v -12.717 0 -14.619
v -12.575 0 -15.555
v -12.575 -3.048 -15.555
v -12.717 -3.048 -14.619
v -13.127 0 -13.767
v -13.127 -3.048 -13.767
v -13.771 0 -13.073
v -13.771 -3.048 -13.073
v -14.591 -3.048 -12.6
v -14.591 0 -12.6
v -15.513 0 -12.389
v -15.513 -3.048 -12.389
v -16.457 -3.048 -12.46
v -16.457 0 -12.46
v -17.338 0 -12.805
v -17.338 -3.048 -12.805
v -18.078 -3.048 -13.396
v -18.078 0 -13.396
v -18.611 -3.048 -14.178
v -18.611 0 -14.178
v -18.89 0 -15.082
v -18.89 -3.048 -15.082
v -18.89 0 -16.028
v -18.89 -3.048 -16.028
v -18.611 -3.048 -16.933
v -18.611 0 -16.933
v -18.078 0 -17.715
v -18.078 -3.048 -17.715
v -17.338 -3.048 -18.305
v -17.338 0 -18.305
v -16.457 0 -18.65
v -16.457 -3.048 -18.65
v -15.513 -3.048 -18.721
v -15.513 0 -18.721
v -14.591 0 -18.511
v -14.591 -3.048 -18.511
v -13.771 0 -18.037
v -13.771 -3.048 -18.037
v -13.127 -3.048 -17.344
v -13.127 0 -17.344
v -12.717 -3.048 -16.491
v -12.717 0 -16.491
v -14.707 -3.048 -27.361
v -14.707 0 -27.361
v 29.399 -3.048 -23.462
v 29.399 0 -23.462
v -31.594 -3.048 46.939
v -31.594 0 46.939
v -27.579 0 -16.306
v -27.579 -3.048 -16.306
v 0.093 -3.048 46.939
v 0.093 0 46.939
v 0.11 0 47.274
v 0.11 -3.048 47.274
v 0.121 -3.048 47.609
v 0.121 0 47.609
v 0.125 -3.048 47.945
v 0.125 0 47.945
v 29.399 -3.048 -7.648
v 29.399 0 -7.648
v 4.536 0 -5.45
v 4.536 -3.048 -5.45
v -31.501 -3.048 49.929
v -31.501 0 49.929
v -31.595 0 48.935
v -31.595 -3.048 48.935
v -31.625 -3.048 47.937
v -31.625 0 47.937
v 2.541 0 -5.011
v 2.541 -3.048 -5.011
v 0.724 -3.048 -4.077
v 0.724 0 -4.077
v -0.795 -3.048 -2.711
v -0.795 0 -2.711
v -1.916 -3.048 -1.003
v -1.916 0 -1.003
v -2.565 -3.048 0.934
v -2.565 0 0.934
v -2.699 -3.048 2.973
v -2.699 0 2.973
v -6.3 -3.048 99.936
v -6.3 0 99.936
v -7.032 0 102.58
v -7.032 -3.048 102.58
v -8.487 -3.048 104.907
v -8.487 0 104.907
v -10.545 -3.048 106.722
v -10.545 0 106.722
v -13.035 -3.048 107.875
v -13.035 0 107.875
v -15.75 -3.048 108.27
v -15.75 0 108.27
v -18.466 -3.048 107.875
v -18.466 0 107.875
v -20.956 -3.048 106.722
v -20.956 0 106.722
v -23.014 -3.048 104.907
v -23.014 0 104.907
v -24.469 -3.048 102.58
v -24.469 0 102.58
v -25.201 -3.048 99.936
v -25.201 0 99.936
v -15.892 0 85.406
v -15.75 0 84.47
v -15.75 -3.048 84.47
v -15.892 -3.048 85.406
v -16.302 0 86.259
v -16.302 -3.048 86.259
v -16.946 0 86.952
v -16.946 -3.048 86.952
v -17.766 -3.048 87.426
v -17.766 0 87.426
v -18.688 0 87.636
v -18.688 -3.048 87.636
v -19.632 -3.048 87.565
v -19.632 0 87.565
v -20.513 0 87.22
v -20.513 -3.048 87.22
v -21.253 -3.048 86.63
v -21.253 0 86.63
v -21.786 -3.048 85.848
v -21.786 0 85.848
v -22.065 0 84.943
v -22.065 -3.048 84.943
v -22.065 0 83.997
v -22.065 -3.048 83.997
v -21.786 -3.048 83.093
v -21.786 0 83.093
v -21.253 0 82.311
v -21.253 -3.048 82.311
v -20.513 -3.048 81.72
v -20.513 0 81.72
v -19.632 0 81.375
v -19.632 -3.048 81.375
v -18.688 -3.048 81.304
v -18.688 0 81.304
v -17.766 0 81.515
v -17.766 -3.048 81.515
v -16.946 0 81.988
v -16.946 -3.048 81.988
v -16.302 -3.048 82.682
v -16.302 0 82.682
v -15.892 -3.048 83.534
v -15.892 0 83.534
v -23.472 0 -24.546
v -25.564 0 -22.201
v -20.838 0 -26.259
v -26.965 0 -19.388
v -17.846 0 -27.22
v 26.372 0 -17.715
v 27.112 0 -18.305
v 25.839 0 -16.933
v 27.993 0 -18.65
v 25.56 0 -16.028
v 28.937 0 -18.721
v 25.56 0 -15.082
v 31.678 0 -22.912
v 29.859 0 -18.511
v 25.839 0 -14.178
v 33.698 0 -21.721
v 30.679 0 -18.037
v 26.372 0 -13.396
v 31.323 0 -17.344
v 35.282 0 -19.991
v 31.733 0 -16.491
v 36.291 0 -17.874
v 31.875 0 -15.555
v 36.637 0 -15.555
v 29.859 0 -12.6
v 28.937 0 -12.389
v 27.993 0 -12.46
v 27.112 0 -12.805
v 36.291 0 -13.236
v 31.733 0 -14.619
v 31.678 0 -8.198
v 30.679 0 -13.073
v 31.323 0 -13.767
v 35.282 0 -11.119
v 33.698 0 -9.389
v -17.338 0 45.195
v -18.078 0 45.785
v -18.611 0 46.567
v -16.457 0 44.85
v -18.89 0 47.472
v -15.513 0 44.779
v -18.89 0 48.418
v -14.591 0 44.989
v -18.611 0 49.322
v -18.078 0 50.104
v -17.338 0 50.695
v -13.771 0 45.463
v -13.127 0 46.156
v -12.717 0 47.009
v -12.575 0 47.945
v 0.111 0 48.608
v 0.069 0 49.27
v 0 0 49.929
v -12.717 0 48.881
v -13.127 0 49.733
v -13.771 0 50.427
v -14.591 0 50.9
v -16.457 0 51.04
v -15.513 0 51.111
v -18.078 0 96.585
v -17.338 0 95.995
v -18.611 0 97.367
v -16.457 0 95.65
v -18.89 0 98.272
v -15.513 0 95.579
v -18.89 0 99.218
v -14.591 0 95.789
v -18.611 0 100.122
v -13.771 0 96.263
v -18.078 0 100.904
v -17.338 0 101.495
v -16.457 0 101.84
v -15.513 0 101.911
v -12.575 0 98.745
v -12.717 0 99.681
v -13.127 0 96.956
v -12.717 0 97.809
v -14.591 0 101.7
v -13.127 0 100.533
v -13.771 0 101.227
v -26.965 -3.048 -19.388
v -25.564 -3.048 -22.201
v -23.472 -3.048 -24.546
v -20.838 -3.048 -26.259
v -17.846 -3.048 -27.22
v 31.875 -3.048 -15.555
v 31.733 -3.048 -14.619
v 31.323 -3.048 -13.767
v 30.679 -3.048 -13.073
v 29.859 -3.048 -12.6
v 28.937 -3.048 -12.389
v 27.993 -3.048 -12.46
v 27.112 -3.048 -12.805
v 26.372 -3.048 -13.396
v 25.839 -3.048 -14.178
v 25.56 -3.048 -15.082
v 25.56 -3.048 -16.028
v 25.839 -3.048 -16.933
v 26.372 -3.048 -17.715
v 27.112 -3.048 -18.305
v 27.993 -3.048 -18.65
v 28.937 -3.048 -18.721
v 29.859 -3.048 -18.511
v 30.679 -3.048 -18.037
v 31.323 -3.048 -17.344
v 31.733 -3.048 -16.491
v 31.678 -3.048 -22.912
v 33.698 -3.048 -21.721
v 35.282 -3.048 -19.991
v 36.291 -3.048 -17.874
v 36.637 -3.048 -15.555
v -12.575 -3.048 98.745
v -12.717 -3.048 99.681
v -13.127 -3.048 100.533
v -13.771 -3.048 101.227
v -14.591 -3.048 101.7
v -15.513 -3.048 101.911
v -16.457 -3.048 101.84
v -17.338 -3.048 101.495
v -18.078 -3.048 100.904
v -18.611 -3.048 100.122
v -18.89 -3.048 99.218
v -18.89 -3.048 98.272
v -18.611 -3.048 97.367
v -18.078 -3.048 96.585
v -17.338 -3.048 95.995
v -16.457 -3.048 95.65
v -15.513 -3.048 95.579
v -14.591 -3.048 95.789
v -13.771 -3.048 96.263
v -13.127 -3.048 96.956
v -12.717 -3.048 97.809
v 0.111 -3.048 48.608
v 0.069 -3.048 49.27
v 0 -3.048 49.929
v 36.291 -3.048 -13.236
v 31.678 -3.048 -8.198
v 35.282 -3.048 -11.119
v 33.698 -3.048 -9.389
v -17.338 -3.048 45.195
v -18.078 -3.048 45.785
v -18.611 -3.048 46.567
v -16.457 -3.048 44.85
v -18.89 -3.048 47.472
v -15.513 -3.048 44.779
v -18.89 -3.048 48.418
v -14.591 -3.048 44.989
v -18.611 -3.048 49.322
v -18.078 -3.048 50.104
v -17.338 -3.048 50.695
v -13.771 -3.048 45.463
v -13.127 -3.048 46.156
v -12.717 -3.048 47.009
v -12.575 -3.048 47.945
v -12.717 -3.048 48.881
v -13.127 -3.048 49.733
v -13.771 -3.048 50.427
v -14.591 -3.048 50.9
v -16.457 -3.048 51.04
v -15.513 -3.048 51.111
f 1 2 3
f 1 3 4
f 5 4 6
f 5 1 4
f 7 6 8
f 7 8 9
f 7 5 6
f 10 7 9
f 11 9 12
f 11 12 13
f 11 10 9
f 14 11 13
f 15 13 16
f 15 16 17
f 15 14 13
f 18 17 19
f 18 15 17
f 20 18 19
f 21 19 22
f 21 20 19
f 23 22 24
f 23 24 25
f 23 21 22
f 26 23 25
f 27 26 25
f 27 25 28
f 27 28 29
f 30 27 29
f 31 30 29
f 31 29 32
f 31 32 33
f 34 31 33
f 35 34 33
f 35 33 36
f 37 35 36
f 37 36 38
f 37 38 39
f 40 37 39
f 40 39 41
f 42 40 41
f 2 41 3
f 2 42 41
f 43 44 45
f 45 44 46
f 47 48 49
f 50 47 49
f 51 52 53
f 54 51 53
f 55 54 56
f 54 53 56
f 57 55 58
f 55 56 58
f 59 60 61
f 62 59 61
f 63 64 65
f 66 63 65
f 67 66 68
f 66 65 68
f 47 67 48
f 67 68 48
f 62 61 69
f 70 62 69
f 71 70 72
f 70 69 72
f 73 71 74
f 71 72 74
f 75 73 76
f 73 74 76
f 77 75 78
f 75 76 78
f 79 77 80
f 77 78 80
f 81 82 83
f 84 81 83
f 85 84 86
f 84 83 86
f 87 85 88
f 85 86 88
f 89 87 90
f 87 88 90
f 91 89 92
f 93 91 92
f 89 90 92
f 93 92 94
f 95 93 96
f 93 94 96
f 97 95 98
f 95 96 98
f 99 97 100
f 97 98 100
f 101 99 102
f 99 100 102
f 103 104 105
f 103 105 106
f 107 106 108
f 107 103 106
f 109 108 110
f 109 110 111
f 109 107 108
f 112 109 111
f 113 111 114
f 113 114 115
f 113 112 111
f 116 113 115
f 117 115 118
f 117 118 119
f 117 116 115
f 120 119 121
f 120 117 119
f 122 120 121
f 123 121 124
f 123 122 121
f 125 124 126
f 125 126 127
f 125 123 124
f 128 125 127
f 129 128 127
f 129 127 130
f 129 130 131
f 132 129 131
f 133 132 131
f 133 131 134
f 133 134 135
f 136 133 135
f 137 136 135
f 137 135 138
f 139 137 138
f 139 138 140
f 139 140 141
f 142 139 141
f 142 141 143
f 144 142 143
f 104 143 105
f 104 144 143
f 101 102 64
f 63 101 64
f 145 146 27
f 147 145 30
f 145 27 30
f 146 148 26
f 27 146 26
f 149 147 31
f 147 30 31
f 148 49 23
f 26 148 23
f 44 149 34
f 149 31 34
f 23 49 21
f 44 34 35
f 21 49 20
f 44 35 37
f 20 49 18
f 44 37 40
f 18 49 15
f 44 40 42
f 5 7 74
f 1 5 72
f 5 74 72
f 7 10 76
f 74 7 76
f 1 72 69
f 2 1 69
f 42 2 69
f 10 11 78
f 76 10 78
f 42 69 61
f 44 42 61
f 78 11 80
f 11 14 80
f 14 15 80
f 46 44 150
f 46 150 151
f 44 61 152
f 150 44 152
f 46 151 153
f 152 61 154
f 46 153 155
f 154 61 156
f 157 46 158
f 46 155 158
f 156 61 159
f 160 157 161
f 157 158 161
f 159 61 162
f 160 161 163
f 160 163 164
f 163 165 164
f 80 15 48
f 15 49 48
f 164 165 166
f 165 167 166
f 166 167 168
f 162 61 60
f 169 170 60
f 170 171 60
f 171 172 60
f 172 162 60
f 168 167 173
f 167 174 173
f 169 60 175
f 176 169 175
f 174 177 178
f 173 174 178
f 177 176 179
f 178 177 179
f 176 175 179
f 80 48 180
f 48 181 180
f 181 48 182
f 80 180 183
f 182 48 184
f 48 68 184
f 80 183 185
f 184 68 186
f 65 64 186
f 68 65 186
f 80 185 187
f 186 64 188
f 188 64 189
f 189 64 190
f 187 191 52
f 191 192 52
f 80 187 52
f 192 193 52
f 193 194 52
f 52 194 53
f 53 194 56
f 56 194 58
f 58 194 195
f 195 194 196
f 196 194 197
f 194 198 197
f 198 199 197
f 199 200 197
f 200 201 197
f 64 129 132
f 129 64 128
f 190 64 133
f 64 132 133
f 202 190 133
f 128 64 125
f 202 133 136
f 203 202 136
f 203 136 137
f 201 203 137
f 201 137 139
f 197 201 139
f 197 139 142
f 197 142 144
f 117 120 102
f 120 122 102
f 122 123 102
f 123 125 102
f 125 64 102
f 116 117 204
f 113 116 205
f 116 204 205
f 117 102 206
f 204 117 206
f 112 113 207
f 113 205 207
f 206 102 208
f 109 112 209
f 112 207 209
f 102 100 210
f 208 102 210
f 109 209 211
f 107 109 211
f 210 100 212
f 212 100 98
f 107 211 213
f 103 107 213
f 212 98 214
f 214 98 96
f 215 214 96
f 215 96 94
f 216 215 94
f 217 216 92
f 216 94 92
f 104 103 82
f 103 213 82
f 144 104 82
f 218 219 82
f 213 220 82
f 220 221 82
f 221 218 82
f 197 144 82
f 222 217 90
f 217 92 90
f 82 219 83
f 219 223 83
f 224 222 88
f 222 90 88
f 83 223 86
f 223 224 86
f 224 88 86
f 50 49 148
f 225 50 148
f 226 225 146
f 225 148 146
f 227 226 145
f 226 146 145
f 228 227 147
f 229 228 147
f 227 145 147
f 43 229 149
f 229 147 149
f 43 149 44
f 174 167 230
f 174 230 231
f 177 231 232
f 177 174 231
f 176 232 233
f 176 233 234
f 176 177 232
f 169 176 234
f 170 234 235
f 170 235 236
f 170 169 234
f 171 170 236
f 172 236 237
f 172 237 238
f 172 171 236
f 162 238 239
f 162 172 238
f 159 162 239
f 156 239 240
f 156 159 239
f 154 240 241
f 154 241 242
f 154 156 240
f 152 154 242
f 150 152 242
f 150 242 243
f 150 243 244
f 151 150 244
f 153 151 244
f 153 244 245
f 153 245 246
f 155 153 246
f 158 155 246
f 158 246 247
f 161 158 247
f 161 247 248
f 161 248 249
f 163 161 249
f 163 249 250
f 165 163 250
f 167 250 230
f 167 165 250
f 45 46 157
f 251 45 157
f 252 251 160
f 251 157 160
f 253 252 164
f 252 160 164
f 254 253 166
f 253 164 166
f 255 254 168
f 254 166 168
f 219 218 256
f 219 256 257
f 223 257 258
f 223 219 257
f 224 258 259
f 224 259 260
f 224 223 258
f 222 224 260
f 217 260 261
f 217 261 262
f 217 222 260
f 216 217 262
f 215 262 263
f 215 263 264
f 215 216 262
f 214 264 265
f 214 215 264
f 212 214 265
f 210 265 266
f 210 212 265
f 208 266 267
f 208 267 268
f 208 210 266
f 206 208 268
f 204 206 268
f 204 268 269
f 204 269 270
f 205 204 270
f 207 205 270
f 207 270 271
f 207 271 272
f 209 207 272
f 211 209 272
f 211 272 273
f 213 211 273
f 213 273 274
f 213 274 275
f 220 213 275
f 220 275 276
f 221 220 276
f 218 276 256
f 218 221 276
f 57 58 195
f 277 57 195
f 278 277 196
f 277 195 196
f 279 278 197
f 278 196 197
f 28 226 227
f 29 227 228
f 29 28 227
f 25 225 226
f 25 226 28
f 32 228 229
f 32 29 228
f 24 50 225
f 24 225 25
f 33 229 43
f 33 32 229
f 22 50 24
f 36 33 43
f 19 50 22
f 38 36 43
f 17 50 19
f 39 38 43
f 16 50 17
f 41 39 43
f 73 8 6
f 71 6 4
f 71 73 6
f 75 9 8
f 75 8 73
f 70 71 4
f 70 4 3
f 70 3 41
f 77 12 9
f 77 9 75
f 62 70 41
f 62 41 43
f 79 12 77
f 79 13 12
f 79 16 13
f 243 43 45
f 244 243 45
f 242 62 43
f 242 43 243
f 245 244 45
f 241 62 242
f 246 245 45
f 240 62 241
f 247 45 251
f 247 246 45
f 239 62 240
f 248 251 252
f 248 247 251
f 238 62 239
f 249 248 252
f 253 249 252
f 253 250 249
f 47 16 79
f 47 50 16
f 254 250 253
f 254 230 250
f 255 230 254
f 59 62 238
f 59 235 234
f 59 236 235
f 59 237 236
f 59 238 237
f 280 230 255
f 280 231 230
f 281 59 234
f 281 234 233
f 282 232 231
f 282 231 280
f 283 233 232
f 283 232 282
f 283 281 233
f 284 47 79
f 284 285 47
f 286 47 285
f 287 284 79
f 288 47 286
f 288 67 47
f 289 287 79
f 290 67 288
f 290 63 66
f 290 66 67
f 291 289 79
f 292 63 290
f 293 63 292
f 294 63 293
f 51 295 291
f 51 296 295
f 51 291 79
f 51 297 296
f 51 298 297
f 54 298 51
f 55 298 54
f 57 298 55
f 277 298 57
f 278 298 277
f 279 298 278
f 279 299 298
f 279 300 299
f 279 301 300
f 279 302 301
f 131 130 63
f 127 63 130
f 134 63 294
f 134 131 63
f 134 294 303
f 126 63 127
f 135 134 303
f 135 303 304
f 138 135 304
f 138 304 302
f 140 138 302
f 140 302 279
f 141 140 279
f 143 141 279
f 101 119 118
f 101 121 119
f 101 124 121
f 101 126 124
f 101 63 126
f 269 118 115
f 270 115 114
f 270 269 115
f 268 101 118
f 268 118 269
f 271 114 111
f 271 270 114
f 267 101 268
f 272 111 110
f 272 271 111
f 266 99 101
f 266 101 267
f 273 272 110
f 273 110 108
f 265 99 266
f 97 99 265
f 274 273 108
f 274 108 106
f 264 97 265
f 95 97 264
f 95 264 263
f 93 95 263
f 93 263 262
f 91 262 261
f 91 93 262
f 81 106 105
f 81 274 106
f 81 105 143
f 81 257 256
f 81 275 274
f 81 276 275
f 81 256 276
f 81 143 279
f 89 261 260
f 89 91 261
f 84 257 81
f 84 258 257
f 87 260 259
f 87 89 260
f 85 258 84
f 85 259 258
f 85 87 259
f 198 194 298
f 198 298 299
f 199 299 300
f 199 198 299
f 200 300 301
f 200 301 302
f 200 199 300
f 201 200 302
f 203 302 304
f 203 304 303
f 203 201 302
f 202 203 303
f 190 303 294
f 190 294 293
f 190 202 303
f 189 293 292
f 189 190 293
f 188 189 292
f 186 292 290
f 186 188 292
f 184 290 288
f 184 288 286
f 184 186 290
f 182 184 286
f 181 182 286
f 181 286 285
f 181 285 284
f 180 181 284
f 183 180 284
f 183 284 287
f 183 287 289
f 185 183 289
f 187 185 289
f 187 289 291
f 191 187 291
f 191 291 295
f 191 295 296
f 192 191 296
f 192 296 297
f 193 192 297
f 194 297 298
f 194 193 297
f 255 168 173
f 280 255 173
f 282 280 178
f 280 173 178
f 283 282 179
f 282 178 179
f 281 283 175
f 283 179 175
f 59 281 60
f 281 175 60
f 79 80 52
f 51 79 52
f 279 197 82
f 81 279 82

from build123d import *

# Parameters (mm, degrees)
F0_R     = 3.175
F1_DEPTH = 3.048


with BuildPart() as f1:
    # F0 (on Front) → F1 (new body)
    with BuildSketch(Plane.XZ):
        with BuildLine():
            ThreePointArc((0.124512, 47.944903), (0.093353, 48.939042), (0, 49.929278))
            ThreePointArc((0, 49.929278), (-15.750488, 63.819903), (-31.500977, 49.929278))
            ThreePointArc((-31.500977, 49.929278), (-31.617878, 48.436388), (-31.593595, 46.939124))
            ThreePointArc((-31.593595, 46.939124), (-15.750488, 32.069903), (0.092619, 46.939124))
            ThreePointArc((0.092619, 46.939124), (0.116536, 47.441761), (0.124512, 47.944903))
        make_face()
        with Locations((-15.750488, 47.944903)):
            Circle(F0_R, mode=Mode.SUBTRACT)
        with BuildLine():
            ThreePointArc((-6.300195, 99.935528), (-6.244183, 99.341386), (-6.225488, 98.744903))
            ThreePointArc((-6.225488, 98.744903), (-16.346972, 89.238598), (-25.200781, 99.935528))
            Line((-25.200781, 99.935528), (-31.500977, 49.929278))
            ThreePointArc((-31.500977, 49.929278), (-15.750488, 63.819903), (0, 49.929278))
            Line((0, 49.929278), (-6.300195, 99.935528))
        make_face()
        with Locations((-18.925488, 84.470103)):
            Circle(F0_R, mode=Mode.SUBTRACT)
        with BuildLine():
            ThreePointArc((-25.200781, 99.935528), (-16.346972, 89.238598), (-6.225488, 98.744903))
            ThreePointArc((-6.225488, 98.744903), (-6.244183, 99.341386), (-6.300195, 99.935528))
            ThreePointArc((-6.300195, 99.935528), (-15.750488, 108.269903), (-25.200781, 99.935528))
        make_face()
        with Locations((-15.750488, 98.744903)):
            Circle(F0_R, mode=Mode.SUBTRACT)
        with BuildLine():
            ThreePointArc((-3.898602, -15.555097), (-16.126122, -3.709165), (-27.578564, -16.305987))
            ThreePointArc((-27.578564, -16.305987), (-23.472446, -24.546124), (-14.70678, -27.360938))
            ThreePointArc((-14.70678, -27.360938), (-7.266757, -23.831178), (-3.922413, -16.305987))
            ThreePointArc((-3.922413, -16.305987), (-3.904557, -15.930731), (-3.898602, -15.555097))
        make_face()
        with Locations((-15.750488, -15.555097)):
            Circle(F0_R, mode=Mode.SUBTRACT)
        with BuildLine():
            ThreePointArc((0.092619, 46.939124), (-15.750488, 32.069903), (-31.593595, 46.939124))
            Line((-31.593595, 46.939124), (-27.578564, -16.305987))
            ThreePointArc((-27.578564, -16.305987), (-16.126122, -3.709165), (-3.898602, -15.555097))
            ThreePointArc((-3.898602, -15.555097), (-3.904557, -15.930731), (-3.922413, -16.305987))
            ThreePointArc((-3.922413, -16.305987), (-7.266757, -23.831178), (-14.70678, -27.360938))
            Line((-14.70678, -27.360938), (29.398509, -23.461759))
            ThreePointArc((29.398509, -23.461759), (20.762012, -15.555097), (29.398509, -7.648435))
            Line((29.398509, -7.648435), (4.535575, -5.450399))
            ThreePointArc((4.535575, -5.450399), (-0.795456, -2.710945), (-2.698537, 2.972608))
            Line((-2.698537, 2.972608), (0.092619, 46.939124))
        make_face()
        with BuildLine():
            ThreePointArc((29.398509, -7.648435), (20.762012, -15.555097), (29.398509, -23.461759))
            ThreePointArc((29.398509, -23.461759), (34.554091, -20.91493), (36.637012, -15.555097))
            ThreePointArc((36.637012, -15.555097), (34.554091, -10.195264), (29.398509, -7.648435))
        make_face()
        with Locations((28.699512, -15.555097)):
            Circle(F0_R, mode=Mode.SUBTRACT)
    extrude(amount=F1_DEPTH)


solid = f1.part
